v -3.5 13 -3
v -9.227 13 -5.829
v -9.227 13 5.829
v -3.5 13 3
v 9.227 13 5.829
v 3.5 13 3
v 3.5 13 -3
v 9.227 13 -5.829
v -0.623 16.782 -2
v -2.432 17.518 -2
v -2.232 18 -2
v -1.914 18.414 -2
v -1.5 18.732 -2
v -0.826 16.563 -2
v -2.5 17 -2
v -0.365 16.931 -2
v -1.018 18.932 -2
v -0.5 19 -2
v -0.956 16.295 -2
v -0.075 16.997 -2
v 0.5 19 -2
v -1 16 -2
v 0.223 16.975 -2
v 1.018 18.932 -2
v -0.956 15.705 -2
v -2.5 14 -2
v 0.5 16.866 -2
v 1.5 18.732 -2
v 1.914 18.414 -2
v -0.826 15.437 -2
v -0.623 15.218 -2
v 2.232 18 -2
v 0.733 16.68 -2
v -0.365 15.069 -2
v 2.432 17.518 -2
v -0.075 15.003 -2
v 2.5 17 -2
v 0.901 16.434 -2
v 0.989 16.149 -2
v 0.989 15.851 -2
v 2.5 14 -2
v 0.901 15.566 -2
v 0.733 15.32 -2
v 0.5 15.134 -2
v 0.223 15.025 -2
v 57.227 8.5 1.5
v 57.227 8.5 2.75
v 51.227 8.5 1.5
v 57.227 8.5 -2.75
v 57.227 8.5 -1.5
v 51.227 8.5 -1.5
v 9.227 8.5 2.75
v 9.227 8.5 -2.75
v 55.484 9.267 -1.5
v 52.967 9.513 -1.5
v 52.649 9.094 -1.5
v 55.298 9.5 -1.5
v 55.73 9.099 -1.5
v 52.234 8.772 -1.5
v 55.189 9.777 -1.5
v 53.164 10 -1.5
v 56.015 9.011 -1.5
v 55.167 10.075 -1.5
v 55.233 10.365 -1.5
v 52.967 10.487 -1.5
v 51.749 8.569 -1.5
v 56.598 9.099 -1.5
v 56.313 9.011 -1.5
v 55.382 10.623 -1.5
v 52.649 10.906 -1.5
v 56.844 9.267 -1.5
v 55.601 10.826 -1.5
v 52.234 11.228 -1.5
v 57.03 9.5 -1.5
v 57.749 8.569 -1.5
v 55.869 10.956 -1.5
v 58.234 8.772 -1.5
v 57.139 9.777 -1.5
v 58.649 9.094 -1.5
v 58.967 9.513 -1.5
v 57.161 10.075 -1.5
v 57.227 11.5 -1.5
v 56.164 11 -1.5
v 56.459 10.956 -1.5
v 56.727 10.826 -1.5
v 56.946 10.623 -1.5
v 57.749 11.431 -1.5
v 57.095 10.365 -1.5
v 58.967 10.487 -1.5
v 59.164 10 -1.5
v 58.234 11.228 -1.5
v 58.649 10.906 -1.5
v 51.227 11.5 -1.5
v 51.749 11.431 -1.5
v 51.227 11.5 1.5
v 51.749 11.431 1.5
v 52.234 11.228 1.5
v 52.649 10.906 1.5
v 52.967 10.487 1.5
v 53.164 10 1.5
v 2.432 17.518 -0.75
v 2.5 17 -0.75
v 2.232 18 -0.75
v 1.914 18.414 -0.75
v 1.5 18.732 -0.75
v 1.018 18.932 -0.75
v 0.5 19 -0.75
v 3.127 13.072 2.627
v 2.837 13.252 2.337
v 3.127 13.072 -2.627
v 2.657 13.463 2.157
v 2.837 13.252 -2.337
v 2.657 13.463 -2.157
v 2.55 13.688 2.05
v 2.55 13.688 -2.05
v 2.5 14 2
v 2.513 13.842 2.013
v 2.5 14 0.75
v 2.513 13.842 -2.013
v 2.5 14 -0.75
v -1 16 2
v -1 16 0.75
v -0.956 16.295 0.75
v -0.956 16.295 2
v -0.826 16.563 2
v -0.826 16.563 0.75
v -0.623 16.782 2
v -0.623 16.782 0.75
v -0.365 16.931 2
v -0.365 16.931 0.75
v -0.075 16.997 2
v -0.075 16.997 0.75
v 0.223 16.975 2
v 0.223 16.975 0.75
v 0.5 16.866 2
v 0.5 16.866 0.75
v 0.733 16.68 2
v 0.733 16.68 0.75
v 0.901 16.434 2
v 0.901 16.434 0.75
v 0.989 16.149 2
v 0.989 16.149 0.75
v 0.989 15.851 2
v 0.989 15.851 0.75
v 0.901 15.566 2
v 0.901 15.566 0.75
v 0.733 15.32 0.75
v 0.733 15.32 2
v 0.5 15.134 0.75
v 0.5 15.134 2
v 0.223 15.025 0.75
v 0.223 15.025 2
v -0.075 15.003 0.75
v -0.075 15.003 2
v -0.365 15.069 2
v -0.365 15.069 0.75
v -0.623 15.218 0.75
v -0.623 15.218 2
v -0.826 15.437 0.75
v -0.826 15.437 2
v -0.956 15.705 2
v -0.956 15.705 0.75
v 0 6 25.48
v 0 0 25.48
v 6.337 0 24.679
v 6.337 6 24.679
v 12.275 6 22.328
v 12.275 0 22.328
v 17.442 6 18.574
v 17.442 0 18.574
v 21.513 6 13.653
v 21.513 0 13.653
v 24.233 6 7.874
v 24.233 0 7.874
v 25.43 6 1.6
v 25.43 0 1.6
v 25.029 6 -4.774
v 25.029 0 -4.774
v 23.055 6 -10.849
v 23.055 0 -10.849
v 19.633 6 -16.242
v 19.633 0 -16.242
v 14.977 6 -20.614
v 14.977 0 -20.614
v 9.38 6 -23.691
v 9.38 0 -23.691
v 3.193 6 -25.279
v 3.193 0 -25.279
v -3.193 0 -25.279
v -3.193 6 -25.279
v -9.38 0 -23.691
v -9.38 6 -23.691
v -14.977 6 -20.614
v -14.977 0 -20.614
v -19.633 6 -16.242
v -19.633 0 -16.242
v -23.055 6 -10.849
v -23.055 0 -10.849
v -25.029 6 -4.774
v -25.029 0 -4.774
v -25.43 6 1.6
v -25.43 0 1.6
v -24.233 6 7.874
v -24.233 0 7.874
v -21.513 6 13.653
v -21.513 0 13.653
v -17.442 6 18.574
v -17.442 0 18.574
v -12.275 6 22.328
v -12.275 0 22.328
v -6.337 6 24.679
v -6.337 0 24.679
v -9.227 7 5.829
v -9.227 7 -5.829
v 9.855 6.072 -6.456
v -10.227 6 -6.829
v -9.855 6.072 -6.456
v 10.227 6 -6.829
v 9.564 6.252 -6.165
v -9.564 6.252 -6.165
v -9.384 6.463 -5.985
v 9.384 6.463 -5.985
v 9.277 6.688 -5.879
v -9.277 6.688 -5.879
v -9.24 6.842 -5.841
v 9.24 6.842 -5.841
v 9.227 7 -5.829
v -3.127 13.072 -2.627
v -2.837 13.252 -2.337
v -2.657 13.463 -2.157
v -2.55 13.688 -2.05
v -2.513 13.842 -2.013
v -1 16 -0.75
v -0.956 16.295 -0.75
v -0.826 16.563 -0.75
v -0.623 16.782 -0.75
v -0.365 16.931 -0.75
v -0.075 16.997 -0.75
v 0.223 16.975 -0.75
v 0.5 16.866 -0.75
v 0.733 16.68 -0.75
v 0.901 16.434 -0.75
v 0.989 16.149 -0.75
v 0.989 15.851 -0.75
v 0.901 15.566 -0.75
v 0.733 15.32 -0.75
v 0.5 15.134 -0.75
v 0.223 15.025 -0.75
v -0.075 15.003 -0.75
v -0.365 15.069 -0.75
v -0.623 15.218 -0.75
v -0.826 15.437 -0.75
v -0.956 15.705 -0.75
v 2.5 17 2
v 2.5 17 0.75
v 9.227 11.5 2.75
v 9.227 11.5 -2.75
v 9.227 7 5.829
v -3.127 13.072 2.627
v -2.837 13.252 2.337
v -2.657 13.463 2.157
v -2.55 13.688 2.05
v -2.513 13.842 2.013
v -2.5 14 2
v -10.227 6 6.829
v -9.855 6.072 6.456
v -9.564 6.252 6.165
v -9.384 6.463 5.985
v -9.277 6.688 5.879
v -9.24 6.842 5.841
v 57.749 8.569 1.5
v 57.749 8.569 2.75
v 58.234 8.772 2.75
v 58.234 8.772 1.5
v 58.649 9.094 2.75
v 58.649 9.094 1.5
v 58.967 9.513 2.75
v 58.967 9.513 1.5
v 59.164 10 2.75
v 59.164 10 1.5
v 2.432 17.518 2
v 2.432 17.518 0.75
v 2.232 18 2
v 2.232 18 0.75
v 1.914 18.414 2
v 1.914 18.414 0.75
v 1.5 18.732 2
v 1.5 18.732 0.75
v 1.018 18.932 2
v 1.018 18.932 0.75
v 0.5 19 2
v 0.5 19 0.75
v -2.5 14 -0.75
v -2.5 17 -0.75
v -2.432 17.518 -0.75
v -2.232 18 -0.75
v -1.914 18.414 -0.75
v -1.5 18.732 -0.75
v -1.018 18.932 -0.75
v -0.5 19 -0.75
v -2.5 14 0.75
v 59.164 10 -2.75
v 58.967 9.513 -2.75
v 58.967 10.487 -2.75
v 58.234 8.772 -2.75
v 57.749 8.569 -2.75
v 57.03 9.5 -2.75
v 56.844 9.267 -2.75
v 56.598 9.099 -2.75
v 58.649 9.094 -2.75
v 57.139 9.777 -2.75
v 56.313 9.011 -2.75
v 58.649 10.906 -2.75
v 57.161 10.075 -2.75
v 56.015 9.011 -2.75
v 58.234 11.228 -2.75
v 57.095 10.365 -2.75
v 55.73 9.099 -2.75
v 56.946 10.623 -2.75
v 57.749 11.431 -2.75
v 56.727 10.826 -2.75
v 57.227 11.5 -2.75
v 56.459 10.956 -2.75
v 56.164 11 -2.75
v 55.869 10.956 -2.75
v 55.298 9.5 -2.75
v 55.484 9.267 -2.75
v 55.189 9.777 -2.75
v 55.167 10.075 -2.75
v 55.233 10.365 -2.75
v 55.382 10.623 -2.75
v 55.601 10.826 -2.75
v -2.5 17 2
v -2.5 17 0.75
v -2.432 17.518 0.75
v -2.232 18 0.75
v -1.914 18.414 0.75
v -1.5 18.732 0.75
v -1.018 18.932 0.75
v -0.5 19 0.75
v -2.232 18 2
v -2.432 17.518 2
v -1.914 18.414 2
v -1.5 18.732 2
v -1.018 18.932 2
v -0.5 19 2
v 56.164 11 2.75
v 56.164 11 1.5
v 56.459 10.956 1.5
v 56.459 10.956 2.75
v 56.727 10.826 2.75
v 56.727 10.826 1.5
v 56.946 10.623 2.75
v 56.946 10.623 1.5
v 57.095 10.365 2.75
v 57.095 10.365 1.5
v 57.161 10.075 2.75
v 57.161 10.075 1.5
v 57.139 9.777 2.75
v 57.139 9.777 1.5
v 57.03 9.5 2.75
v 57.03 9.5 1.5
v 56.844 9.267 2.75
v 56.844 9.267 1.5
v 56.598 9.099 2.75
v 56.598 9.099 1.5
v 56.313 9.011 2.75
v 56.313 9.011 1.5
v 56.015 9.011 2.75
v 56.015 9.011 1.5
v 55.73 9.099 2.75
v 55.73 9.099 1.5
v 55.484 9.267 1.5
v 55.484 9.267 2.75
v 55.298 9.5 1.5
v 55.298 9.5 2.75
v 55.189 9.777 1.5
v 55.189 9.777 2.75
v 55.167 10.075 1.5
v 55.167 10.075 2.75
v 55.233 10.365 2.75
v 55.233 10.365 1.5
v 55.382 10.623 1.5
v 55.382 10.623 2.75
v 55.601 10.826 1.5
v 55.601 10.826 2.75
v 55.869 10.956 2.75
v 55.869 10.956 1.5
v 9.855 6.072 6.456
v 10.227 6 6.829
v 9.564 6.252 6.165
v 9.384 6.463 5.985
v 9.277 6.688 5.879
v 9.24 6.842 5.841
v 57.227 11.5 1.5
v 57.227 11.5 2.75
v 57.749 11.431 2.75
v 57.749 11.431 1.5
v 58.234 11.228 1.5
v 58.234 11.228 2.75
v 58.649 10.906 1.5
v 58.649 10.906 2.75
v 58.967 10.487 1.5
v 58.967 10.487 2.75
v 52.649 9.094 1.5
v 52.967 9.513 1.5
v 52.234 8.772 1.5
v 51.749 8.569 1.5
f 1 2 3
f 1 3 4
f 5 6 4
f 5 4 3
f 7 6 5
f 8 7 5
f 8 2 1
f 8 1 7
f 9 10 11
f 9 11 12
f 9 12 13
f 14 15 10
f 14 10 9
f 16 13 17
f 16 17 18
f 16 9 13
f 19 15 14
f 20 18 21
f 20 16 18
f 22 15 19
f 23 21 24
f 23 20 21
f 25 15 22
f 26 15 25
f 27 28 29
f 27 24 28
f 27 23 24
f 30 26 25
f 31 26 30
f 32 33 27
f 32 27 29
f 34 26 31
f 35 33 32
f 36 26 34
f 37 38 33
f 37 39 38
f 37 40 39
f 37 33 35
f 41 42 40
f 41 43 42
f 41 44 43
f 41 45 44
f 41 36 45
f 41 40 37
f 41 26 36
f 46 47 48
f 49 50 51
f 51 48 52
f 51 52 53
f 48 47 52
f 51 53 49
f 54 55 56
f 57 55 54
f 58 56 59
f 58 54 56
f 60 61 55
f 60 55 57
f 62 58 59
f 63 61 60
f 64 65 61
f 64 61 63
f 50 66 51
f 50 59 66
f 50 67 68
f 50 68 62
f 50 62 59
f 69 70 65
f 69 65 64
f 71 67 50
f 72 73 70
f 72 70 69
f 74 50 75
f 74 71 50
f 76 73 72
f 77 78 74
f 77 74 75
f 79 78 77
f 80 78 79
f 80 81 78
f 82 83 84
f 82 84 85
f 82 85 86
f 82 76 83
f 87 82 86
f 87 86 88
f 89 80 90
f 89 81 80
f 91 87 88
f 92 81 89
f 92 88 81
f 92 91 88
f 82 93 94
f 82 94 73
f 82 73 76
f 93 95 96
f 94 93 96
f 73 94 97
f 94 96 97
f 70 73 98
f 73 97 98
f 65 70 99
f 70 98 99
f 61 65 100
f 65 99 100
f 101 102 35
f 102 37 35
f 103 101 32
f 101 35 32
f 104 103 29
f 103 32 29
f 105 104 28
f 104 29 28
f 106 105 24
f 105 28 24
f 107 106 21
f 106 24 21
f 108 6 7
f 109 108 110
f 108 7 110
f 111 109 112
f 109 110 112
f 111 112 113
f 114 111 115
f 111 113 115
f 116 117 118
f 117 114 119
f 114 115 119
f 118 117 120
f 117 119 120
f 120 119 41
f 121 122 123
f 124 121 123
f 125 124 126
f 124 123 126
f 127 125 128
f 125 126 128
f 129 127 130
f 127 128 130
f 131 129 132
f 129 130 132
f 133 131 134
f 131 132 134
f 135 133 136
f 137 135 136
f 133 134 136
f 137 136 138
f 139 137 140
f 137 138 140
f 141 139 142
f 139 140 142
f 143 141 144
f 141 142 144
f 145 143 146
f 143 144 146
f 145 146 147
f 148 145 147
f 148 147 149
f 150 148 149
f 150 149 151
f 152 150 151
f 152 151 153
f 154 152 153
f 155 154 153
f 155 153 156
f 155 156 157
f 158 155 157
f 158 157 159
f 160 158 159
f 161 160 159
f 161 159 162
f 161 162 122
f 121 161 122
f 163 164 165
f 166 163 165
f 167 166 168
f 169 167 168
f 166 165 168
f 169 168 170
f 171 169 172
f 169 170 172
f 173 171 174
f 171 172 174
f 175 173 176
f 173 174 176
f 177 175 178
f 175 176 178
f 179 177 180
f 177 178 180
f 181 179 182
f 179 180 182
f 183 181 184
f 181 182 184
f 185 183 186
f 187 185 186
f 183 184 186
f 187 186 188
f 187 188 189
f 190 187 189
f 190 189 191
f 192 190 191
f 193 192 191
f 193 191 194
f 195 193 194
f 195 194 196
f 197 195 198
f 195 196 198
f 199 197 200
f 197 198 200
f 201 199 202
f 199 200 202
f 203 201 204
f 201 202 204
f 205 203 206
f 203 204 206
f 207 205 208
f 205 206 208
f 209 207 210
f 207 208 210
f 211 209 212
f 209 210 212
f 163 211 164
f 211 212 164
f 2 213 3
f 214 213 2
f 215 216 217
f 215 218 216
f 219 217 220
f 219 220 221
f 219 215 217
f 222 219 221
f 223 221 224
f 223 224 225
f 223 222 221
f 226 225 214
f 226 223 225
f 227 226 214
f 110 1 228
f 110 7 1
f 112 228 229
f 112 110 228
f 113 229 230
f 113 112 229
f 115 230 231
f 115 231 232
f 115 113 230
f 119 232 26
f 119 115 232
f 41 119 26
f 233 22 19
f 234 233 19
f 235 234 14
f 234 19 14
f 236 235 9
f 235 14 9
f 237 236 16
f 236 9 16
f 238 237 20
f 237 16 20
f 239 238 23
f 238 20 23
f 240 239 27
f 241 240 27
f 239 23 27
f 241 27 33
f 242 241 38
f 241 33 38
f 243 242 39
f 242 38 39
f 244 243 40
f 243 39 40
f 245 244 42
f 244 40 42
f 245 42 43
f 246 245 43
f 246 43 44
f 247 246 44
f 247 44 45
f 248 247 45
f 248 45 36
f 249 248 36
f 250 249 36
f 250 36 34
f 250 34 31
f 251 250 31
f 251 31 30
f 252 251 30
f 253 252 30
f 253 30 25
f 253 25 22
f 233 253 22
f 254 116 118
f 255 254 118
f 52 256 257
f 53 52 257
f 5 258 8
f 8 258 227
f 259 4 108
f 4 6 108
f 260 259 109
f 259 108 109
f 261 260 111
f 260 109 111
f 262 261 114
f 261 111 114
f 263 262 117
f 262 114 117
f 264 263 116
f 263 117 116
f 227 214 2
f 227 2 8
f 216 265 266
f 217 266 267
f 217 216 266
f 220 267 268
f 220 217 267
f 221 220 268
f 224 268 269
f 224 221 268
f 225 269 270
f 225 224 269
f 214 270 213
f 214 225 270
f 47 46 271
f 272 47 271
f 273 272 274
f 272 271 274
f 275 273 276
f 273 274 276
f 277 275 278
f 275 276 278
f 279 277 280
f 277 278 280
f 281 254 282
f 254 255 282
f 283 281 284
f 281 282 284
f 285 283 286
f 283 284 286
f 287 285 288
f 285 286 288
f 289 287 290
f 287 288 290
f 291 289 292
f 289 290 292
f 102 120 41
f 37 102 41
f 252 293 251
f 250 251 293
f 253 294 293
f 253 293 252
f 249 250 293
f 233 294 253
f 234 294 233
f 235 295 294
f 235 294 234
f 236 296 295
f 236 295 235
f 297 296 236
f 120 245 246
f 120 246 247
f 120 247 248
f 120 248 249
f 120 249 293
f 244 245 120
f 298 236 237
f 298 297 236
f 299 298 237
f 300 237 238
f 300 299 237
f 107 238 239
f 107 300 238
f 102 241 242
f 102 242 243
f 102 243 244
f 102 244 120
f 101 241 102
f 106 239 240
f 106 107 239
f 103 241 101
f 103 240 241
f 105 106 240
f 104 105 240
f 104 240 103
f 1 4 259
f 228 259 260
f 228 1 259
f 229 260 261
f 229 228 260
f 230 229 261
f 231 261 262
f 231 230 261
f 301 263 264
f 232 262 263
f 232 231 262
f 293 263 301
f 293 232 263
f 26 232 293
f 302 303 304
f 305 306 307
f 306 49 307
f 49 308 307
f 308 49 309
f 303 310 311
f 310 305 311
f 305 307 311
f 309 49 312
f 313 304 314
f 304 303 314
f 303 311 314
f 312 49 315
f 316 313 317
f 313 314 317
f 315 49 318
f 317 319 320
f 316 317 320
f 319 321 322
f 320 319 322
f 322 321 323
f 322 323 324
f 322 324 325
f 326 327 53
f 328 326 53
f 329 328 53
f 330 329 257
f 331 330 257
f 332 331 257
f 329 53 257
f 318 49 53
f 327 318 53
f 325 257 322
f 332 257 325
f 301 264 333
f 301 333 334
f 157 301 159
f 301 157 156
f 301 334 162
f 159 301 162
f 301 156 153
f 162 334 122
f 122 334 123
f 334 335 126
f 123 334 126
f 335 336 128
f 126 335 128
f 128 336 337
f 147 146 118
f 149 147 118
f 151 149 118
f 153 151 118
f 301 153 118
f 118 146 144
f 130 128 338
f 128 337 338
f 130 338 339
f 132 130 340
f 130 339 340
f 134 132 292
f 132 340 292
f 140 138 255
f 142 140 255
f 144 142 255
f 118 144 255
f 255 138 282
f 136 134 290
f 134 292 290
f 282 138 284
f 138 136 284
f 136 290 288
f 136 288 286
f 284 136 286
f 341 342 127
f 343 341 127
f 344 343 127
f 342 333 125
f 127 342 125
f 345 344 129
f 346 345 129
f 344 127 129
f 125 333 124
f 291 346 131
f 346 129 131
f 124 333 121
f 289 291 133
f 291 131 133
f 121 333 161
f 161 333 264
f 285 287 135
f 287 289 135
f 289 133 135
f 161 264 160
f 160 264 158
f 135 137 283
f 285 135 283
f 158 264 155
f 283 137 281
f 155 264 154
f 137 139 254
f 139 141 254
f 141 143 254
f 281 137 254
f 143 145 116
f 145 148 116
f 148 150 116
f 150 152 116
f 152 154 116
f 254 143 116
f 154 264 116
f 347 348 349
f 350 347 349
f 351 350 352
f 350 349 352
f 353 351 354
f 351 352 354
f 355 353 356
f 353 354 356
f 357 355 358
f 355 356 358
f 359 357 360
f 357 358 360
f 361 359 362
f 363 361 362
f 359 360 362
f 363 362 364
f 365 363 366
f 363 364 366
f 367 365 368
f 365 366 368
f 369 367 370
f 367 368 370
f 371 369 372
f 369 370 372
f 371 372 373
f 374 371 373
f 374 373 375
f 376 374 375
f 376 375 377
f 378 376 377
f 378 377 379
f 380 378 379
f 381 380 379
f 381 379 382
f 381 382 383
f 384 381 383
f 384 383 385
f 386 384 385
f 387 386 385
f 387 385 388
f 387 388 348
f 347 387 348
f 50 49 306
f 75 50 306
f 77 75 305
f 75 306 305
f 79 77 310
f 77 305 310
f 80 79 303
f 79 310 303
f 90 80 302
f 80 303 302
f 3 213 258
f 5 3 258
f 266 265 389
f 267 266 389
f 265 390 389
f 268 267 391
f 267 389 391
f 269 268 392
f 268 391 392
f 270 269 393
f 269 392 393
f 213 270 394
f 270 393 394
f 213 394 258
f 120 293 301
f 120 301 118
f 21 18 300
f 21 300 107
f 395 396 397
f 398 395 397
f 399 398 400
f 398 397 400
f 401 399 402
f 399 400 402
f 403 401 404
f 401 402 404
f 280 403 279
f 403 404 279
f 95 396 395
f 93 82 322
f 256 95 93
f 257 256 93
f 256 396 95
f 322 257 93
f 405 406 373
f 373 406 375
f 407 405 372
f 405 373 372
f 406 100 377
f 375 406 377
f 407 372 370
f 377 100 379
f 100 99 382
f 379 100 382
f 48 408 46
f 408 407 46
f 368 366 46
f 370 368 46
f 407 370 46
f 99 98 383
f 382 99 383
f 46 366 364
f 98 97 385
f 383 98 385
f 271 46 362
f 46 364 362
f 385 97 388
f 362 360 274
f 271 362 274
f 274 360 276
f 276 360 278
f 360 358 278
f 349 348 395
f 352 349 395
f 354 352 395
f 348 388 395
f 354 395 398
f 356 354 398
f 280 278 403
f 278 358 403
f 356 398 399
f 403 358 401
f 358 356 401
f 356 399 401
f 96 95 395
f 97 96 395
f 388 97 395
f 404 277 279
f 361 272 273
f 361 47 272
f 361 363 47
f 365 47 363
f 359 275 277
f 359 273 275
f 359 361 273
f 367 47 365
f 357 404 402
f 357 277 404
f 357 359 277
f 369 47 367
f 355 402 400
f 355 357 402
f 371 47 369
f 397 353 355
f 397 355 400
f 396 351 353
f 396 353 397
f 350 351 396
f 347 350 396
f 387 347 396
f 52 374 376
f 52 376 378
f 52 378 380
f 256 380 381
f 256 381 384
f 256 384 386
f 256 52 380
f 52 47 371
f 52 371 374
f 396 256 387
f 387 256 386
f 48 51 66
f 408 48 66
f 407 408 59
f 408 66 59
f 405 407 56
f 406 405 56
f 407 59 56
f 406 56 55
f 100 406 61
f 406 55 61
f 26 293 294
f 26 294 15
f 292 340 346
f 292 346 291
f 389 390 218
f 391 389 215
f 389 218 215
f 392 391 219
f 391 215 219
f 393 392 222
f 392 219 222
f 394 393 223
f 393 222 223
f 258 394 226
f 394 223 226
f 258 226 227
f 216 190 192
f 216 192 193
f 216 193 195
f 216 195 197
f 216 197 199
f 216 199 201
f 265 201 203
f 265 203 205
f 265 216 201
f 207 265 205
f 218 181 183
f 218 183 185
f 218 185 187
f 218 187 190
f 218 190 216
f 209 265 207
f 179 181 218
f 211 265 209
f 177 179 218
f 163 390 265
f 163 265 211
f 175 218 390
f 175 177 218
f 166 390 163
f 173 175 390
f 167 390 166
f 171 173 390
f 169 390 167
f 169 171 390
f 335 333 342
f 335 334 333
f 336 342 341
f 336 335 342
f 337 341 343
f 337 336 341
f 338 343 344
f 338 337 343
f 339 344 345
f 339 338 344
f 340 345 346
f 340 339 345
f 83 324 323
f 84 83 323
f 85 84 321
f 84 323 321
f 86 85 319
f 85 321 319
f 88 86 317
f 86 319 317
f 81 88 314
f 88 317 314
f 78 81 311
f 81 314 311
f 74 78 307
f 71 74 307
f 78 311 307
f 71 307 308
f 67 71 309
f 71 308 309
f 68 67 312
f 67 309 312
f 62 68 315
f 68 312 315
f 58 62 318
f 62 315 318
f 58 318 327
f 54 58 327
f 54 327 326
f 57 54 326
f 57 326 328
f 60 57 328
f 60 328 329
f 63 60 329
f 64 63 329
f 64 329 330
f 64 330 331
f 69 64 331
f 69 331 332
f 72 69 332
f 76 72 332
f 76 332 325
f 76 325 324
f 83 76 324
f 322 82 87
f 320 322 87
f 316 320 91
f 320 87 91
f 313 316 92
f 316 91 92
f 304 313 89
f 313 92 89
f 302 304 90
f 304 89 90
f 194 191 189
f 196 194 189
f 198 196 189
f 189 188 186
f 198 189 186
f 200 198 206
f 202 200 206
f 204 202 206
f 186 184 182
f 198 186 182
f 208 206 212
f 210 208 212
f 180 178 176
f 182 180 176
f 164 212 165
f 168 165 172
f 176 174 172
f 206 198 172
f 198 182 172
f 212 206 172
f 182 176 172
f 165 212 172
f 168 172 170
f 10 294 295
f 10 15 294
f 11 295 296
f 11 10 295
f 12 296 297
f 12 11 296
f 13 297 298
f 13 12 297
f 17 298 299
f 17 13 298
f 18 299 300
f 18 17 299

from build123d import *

# Parameters (mm, degrees)
SKETCH1_R           = 25.48
BOSS_EXTRUDE1_DEPTH = 6
SKETCH2_W           = 18.454793018
SKETCH2_H           = 11.657566824
BOSS_EXTRUDE2_DEPTH = 7
FILLET1_R           = 1
SKETCH3_W           = 5.5
SKETCH3_H           = 3
BOSS_EXTRUDE3_DEPTH = 50
SKETCH7_W           = 6
SKETCH7_H           = 3
CUT_EXTRUDE3_DEPTH  = 66.493243142
FILLET3_R           = 2
SKETCH9_W           = 5
SKETCH9_H           = 4
BOSS_EXTRUDE4_DEPTH = 6
FILLET4_R           = 1
SKETCH10_W          = 9.060277754
SKETCH10_H          = 1.5
CUT_EXTRUDE5_DEPTH  = 5
SKETCH11_R          = 1
CUT_EXTRUDE6_DEPTH  = 68.944948781
FILLET5_R           = 2
FILLET6_R           = 2
SKETCH13_R          = 1
CUT_EXTRUDE7_DEPTH  = 69.251729391


with BuildPart() as part:
    # Sketch1 → Boss-Extrude1 (new body)
    with BuildSketch(Plane(origin=(0, 0, 0), x_dir=(1, 0, 0), z_dir=(0, 1, 0))):
        with Locations(Location((0, 0, 0), (0, 0, 270))):
            Circle(SKETCH1_R)
    extrude(amount=BOSS_EXTRUDE1_DEPTH)

    # Sketch2 → Boss-Extrude2 (add)
    with BuildSketch(Plane(origin=(0, 6, 0), x_dir=(1, 0, 0), z_dir=(0, 1, 0))):
        Rectangle(SKETCH2_W, SKETCH2_H)
    extrude(amount=BOSS_EXTRUDE2_DEPTH)

    # Fillet1
    fillet1_edges = [part.edges().sort_by_distance(p)[0] for p in [
        (9.227396509, 6, 0),
        (0, 6, -5.828783412),
        (-9.227396509, 6, 0),
        (0, 6, 5.828783412),
    ]]
    fillet(fillet1_edges, radius=FILLET1_R)

    # Sketch9 → Boss-Extrude4 (add)
    with BuildSketch(Plane(origin=(0, 13, 0), x_dir=(1, 0, 0), z_dir=(0, 1, 0))):
        Rectangle(SKETCH9_W, SKETCH9_H)
    extrude(amount=BOSS_EXTRUDE4_DEPTH)

    # Fillet4
    fillet4_edges = [part.edges().sort_by_distance(p)[0] for p in [
        (2.5, 13, 0),
        (0, 13, -2),
        (-2.5, 13, 0),
        (0, 13, 2),
    ]]
    fillet(fillet4_edges, radius=FILLET4_R)

    # Sketch10 → Cut-Extrude5 (cut)
    with BuildSketch(Plane(origin=(0, 19, 0), x_dir=(1, 0, 0), z_dir=(0, 1, 0))):
        Rectangle(SKETCH10_W, SKETCH10_H)
    extrude(amount=-CUT_EXTRUDE5_DEPTH, mode=Mode.SUBTRACT)

    # Sketch11 → Cut-Extrude6 (cut, through all)
    with BuildSketch(Plane(origin=(0, 0, -2), x_dir=(-1, 0, 0), z_dir=(0, 0, -1))):
        with Locations((0, 16)):
            Circle(SKETCH11_R)
    extrude(amount=-CUT_EXTRUDE6_DEPTH, mode=Mode.SUBTRACT)

    # Fillet5
    fillet5_edges = [part.edges().sort_by_distance(p)[0] for p in [
        (2.5, 19, 1.375),
        (-2.5, 19, -1.375),
        (2.5, 19, -1.375),
        (-2.5, 19, 1.375),
    ]]
    fillet(fillet5_edges, radius=FILLET5_R)


with BuildPart() as body_2:
    # Sketch3 → Boss-Extrude3 (new body)
    with BuildSketch(Plane(origin=(9.227396509, 0, 0), x_dir=(0, 0, -1), z_dir=(1, 0, 0))):
        with Locations((0, 10)):
            Rectangle(SKETCH3_W, SKETCH3_H)
    extrude(amount=BOSS_EXTRUDE3_DEPTH)

    # Sketch7 → Cut-Extrude3 (cut, through all)
    with BuildSketch(Plane(origin=(0, 11.5, 0), x_dir=(1, 0, 0), z_dir=(0, 1, 0))):
        with Locations((56.227396509, 0)):
            Rectangle(SKETCH7_W, SKETCH7_H)
    extrude(amount=-CUT_EXTRUDE3_DEPTH, mode=Mode.SUBTRACT)

    # Fillet3
    # the kernel refuses this fillet: 2 mm, written as the material it takes off along each edge
    with BuildSketch(Plane(origin=(59.227396509, 8.5, -3.5), x_dir=(0, 1, 0), z_dir=(0, 0, 1)), Plane(origin=(59.227396509, 8.5, -7.75), x_dir=(0, 1, 0), z_dir=(0, 0, 1))) as fillet3_piece_1:
        with BuildLine():
            CenterArc((FILLET3_R, FILLET3_R), FILLET3_R, 180, 90)
            Line((0, FILLET3_R), (0, 0))
            Line((0, 0), (FILLET3_R, 0))
        make_face()
    extrude(amount=11.25, mode=Mode.SUBTRACT)
    with BuildSketch(Plane(origin=(59.227396509, 11.5, 7.75), x_dir=(-1, 0, 0), z_dir=(0, 0, -1)), Plane(origin=(59.227396509, 11.5, 3.5), x_dir=(-1, 0, 0), z_dir=(0, 0, -1))) as fillet3_piece_2:
        with BuildLine():
            CenterArc((FILLET3_R, -FILLET3_R), FILLET3_R, 90, 90)
            Line((0, -FILLET3_R), (0, 0))
            Line((0, 0), (FILLET3_R, 0))
        make_face()
    extrude(amount=11.25, mode=Mode.SUBTRACT)

    # Fillet6
    # the kernel refuses this fillet: 2 mm, written as the material it takes off along each edge
    with BuildSketch(Plane(origin=(53.227396509, 8.5, -1.5), x_dir=(0, 1, 0), z_dir=(0, 0, 1))) as fillet6_piece_1:
        with BuildLine():
            CenterArc((FILLET6_R, FILLET6_R), FILLET6_R, 180, 90)
            Line((0, FILLET6_R), (0, 0))
            Line((0, 0), (FILLET6_R, 0))
        make_face()
    extrude(amount=3, mode=Mode.SUBTRACT)
    with BuildSketch(Plane(origin=(53.227396509, 11.5, 1.5), x_dir=(-1, 0, 0), z_dir=(0, 0, -1))) as fillet6_piece_2:
        with BuildLine():
            CenterArc((FILLET6_R, -FILLET6_R), FILLET6_R, 90, 90)
            Line((0, -FILLET6_R), (0, 0))
            Line((0, 0), (FILLET6_R, 0))
        make_face()
    extrude(amount=3, mode=Mode.SUBTRACT)

    # Sketch13 → Cut-Extrude7 (cut, through all)
    with BuildSketch(Plane(origin=(0, 0, -2.75), x_dir=(-1, 0, 0), z_dir=(0, 0, -1))):
        with Locations(Location((-56.163888182, 10, 0), (0, 0, 90))):
            Circle(SKETCH13_R)
    extrude(amount=-CUT_EXTRUDE7_DEPTH, mode=Mode.SUBTRACT)


solid = Compound([part.part, body_2.part])
